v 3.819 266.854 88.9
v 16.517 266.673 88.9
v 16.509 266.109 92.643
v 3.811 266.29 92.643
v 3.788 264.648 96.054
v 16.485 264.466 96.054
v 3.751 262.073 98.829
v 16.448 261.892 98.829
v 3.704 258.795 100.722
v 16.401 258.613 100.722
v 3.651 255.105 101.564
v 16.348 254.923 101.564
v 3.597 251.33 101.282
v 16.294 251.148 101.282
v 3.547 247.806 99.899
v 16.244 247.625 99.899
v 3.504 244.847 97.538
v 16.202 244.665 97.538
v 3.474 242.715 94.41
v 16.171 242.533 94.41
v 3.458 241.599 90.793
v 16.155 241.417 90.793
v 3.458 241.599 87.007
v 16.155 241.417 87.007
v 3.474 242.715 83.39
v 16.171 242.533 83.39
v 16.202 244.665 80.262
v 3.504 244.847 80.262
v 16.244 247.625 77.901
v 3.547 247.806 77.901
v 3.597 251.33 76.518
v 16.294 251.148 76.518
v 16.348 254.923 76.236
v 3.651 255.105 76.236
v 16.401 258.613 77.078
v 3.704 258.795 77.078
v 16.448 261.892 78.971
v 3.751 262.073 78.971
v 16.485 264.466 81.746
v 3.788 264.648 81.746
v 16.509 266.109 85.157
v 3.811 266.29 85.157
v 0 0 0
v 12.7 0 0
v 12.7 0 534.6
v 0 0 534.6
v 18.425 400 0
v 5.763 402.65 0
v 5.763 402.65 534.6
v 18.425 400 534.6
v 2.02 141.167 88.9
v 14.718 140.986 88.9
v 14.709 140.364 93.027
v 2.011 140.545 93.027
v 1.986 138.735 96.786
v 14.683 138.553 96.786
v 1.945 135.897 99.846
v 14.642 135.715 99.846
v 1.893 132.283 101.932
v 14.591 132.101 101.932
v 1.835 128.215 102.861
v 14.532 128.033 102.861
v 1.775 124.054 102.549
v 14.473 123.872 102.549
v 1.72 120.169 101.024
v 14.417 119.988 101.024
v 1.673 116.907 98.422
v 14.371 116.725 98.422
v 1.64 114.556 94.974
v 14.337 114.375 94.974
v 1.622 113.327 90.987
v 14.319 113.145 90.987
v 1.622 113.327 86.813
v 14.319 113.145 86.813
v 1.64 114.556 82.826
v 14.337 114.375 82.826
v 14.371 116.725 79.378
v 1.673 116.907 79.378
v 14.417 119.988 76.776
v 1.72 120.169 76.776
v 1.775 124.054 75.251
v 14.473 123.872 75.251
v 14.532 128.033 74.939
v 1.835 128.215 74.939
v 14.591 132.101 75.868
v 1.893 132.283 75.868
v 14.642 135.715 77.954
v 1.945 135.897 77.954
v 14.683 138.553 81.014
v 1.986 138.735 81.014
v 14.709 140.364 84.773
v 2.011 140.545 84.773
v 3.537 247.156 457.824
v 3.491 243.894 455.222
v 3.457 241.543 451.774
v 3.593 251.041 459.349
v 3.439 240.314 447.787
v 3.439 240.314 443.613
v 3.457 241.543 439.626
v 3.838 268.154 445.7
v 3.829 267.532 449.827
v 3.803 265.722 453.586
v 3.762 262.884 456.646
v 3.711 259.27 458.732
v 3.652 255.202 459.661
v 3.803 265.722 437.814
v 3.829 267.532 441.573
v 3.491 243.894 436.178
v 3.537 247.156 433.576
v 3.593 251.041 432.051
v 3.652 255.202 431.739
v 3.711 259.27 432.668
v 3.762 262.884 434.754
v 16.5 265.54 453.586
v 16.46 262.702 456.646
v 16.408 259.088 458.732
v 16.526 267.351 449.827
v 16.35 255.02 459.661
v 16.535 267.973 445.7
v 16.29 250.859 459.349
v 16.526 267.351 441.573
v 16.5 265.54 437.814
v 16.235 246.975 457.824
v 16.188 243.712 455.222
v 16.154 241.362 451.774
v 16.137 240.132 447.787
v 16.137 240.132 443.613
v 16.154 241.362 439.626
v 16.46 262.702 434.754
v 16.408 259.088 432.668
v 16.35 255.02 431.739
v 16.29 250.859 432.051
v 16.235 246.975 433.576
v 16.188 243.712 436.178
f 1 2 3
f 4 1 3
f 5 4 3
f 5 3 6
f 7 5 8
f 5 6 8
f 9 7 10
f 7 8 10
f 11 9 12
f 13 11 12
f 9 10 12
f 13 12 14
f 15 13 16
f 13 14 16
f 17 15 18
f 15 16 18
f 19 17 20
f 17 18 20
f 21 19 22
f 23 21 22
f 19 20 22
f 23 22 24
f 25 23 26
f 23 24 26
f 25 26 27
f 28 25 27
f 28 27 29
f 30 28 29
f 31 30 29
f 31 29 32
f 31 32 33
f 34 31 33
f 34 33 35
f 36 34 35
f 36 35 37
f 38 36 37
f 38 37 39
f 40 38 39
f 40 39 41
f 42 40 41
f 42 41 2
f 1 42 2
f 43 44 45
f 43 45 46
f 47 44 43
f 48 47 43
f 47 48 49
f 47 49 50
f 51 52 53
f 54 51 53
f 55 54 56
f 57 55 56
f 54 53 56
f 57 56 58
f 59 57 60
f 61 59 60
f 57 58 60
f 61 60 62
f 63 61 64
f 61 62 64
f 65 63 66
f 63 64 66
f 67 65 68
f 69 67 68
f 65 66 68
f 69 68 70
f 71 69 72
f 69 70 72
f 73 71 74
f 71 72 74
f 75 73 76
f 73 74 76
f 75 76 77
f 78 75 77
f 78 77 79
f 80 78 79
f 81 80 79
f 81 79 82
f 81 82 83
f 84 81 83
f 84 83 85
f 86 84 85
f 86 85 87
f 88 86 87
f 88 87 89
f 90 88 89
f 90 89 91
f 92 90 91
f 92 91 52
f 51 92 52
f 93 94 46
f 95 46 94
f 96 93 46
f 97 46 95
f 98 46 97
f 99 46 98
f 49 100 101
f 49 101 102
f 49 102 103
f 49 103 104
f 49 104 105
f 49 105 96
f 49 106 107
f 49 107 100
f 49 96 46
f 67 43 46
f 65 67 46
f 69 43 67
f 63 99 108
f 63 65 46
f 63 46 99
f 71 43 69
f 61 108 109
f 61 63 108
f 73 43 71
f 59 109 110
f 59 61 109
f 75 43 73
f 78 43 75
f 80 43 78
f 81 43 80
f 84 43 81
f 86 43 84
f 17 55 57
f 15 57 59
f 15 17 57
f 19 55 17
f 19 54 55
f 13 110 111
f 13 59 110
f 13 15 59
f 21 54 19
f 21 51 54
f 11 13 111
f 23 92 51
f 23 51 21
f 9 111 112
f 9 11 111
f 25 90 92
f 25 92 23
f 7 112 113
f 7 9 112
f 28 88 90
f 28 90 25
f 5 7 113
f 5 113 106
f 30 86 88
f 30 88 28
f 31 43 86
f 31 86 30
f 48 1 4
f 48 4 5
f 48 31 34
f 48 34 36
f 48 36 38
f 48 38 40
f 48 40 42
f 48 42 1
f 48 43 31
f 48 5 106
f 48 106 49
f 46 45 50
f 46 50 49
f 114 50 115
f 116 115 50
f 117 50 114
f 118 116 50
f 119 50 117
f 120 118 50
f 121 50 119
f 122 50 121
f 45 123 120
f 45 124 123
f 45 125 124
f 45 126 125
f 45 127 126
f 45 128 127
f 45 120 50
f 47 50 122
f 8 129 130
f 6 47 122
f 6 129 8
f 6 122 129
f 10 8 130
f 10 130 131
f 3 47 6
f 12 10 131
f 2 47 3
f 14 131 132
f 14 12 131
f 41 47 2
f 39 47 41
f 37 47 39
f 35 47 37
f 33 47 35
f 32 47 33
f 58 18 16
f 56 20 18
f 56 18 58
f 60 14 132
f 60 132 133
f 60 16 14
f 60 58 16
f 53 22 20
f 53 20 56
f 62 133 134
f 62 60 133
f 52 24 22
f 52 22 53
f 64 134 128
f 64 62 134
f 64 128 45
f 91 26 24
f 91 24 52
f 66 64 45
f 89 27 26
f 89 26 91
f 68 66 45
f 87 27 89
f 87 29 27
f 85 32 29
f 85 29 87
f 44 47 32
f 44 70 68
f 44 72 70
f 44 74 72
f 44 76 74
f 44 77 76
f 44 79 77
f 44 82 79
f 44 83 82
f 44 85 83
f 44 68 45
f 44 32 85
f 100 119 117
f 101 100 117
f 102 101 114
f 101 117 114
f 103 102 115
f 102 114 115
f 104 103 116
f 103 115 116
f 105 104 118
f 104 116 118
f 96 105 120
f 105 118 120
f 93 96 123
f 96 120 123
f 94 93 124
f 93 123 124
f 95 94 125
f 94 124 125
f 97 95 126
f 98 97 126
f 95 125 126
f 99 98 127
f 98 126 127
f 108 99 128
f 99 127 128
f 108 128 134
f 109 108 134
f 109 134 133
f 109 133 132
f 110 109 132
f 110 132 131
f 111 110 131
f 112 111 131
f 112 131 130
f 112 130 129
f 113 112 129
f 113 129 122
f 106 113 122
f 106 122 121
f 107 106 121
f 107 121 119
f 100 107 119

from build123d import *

# Parameters (mm, degrees)
BOSS_EXTRUDE1_DEPTH = 534.6
SKETCH2_R           = 12.7
CUT_EXTRUDE1_DEPTH  = 18.288
SKETCH3_R           = 14
CUT_EXTRUDE2_DEPTH  = 18.288
SKETCH4_R           = 14
CUT_EXTRUDE3_DEPTH  = 18.288


with BuildPart() as part:
    # Sketch1 → Boss-Extrude1 (new body)
    with BuildSketch(Plane.XY):
        Polygon((0, 0), (5.762672042, 402.6498479), (18.424747765, 400), (12.7, 0), align=None)
    extrude(amount=BOSS_EXTRUDE1_DEPTH)

    # Sketch2 → Cut-Extrude1 (cut)
    with BuildSketch(Plane(origin=(12.697399197, -0.181723519, 0), x_dir=(0, 0, -1), z_dir=(0.9998976009274501, -0.014310403891230014, 0))):
        with Locations(Location((-88.9, 254.181742129, 0), (0, 0, 90))):
            Circle(SKETCH2_R)
    extrude(amount=-CUT_EXTRUDE1_DEPTH, mode=Mode.SUBTRACT)

    # Sketch3 → Cut-Extrude2 (cut)
    with BuildSketch(Plane(origin=(12.697399197, -0.181723519, 0), x_dir=(0, 0, -1), z_dir=(0.9998976009274501, -0.014310403891230014, 0))):
        with Locations(Location((-88.9, 127.181742129, 0), (0, 0, 90))):
            Circle(SKETCH3_R)
    extrude(amount=-CUT_EXTRUDE2_DEPTH, mode=Mode.SUBTRACT)

    # Sketch4 → Cut-Extrude3 (cut)
    with BuildSketch(Plane(origin=(12.697399197, -0.181723519, 0), x_dir=(0, 0, -1), z_dir=(0.9998976009274501, -0.014310403891230014, 0))):
        with Locations(Location((-445.7, 254.181742129, 0), (0, 0, 90))):
            Circle(SKETCH4_R)
    extrude(amount=-CUT_EXTRUDE3_DEPTH, mode=Mode.SUBTRACT)


solid = part.part
